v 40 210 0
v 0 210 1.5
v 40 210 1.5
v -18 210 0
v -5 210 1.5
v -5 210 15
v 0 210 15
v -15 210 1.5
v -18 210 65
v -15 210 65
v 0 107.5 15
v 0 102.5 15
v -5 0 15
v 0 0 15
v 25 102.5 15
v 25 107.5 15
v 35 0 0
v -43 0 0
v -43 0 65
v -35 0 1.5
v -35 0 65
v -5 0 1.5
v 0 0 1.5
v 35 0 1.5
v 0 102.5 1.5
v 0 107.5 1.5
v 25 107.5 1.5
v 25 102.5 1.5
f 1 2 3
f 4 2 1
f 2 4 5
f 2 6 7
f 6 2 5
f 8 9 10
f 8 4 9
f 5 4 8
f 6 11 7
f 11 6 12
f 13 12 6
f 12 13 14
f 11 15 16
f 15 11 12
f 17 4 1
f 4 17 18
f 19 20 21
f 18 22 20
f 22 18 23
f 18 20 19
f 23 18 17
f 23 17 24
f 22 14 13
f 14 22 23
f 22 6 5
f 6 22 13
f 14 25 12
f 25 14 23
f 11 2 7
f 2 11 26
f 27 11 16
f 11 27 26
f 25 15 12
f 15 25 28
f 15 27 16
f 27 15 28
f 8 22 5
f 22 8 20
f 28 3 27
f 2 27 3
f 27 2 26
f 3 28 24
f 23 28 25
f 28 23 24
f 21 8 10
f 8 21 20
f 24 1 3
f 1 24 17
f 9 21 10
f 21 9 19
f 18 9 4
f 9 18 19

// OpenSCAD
sh=15;      // support height
l =210;     // construction length
ft=1.5;     // floor thickness
wt=3;       // wall thickness
wh=65;      // wall height

module leftWallImpl()
{
  // internal support
  cube([l, 5, sh]);
  translate([(l-5)/2, -25, 0])
    cube([5, 25, sh]);
  // ground floor
  polyhedron(
    points = [
               [0, 30+5,  0],   // 0
               [l, 10+5,  0],   // 1
               [l,  -40,  0],   // 2
               [0,  -35,  0],   // 3
               [0, 30+5, ft],   // 4
               [l, 10+5, ft],   // 5
               [l,  -40, ft],   // 6
               [0,  -35, ft],   // 7
             ],
    faces = [
              // bottom surface:
              [0, 2, 1],
              [0, 3, 2],
              // top surface:
              [4, 5, 6],
              [4, 6, 7],
              // left wall:
              [0,7,3],
              [0,4,7],
              // right wall:
              [1,2,6],
              [1,6,5],
              // top wall:
              [0,1,5],
              [0,5,4],
              // bottom wall:
              [3,6,2],
              [3,7,6],
            ]
  );
  // main wall
  polyhedron(
    points = [
               [0, 30+5,     0],   // 0
               [l, 10+5,     0],   // 1
               [l, 10+5+wt,  0],   // 2
               [0, 35+5+wt,  0],   // 3
               [0, 30+5,    wh],   // 4
               [l, 10+5,    wh],   // 5
               [l, 10+5+wt, wh],   // 6
               [0, 35+5+wt, wh],   // 7
             ],
    faces = [
              // bottom surface:
              [0, 2, 1],
              [0, 3, 2],
              // top surface:
              [4, 5, 6],
              [4, 6, 7],
              // left wall:
              [0,7,3],
              [0,4,7],
              // right wall:
              [1,2,6],
              [1,6,5],
              // top wall:
              [0,1,5],
              [0,5,4],
              // bottom wall:
              [3,6,2],
              [3,7,6],
            ]
  );
}

module leftWall()
{
  rotate([0,0,90])
    leftWallImpl();
}

leftWall();
